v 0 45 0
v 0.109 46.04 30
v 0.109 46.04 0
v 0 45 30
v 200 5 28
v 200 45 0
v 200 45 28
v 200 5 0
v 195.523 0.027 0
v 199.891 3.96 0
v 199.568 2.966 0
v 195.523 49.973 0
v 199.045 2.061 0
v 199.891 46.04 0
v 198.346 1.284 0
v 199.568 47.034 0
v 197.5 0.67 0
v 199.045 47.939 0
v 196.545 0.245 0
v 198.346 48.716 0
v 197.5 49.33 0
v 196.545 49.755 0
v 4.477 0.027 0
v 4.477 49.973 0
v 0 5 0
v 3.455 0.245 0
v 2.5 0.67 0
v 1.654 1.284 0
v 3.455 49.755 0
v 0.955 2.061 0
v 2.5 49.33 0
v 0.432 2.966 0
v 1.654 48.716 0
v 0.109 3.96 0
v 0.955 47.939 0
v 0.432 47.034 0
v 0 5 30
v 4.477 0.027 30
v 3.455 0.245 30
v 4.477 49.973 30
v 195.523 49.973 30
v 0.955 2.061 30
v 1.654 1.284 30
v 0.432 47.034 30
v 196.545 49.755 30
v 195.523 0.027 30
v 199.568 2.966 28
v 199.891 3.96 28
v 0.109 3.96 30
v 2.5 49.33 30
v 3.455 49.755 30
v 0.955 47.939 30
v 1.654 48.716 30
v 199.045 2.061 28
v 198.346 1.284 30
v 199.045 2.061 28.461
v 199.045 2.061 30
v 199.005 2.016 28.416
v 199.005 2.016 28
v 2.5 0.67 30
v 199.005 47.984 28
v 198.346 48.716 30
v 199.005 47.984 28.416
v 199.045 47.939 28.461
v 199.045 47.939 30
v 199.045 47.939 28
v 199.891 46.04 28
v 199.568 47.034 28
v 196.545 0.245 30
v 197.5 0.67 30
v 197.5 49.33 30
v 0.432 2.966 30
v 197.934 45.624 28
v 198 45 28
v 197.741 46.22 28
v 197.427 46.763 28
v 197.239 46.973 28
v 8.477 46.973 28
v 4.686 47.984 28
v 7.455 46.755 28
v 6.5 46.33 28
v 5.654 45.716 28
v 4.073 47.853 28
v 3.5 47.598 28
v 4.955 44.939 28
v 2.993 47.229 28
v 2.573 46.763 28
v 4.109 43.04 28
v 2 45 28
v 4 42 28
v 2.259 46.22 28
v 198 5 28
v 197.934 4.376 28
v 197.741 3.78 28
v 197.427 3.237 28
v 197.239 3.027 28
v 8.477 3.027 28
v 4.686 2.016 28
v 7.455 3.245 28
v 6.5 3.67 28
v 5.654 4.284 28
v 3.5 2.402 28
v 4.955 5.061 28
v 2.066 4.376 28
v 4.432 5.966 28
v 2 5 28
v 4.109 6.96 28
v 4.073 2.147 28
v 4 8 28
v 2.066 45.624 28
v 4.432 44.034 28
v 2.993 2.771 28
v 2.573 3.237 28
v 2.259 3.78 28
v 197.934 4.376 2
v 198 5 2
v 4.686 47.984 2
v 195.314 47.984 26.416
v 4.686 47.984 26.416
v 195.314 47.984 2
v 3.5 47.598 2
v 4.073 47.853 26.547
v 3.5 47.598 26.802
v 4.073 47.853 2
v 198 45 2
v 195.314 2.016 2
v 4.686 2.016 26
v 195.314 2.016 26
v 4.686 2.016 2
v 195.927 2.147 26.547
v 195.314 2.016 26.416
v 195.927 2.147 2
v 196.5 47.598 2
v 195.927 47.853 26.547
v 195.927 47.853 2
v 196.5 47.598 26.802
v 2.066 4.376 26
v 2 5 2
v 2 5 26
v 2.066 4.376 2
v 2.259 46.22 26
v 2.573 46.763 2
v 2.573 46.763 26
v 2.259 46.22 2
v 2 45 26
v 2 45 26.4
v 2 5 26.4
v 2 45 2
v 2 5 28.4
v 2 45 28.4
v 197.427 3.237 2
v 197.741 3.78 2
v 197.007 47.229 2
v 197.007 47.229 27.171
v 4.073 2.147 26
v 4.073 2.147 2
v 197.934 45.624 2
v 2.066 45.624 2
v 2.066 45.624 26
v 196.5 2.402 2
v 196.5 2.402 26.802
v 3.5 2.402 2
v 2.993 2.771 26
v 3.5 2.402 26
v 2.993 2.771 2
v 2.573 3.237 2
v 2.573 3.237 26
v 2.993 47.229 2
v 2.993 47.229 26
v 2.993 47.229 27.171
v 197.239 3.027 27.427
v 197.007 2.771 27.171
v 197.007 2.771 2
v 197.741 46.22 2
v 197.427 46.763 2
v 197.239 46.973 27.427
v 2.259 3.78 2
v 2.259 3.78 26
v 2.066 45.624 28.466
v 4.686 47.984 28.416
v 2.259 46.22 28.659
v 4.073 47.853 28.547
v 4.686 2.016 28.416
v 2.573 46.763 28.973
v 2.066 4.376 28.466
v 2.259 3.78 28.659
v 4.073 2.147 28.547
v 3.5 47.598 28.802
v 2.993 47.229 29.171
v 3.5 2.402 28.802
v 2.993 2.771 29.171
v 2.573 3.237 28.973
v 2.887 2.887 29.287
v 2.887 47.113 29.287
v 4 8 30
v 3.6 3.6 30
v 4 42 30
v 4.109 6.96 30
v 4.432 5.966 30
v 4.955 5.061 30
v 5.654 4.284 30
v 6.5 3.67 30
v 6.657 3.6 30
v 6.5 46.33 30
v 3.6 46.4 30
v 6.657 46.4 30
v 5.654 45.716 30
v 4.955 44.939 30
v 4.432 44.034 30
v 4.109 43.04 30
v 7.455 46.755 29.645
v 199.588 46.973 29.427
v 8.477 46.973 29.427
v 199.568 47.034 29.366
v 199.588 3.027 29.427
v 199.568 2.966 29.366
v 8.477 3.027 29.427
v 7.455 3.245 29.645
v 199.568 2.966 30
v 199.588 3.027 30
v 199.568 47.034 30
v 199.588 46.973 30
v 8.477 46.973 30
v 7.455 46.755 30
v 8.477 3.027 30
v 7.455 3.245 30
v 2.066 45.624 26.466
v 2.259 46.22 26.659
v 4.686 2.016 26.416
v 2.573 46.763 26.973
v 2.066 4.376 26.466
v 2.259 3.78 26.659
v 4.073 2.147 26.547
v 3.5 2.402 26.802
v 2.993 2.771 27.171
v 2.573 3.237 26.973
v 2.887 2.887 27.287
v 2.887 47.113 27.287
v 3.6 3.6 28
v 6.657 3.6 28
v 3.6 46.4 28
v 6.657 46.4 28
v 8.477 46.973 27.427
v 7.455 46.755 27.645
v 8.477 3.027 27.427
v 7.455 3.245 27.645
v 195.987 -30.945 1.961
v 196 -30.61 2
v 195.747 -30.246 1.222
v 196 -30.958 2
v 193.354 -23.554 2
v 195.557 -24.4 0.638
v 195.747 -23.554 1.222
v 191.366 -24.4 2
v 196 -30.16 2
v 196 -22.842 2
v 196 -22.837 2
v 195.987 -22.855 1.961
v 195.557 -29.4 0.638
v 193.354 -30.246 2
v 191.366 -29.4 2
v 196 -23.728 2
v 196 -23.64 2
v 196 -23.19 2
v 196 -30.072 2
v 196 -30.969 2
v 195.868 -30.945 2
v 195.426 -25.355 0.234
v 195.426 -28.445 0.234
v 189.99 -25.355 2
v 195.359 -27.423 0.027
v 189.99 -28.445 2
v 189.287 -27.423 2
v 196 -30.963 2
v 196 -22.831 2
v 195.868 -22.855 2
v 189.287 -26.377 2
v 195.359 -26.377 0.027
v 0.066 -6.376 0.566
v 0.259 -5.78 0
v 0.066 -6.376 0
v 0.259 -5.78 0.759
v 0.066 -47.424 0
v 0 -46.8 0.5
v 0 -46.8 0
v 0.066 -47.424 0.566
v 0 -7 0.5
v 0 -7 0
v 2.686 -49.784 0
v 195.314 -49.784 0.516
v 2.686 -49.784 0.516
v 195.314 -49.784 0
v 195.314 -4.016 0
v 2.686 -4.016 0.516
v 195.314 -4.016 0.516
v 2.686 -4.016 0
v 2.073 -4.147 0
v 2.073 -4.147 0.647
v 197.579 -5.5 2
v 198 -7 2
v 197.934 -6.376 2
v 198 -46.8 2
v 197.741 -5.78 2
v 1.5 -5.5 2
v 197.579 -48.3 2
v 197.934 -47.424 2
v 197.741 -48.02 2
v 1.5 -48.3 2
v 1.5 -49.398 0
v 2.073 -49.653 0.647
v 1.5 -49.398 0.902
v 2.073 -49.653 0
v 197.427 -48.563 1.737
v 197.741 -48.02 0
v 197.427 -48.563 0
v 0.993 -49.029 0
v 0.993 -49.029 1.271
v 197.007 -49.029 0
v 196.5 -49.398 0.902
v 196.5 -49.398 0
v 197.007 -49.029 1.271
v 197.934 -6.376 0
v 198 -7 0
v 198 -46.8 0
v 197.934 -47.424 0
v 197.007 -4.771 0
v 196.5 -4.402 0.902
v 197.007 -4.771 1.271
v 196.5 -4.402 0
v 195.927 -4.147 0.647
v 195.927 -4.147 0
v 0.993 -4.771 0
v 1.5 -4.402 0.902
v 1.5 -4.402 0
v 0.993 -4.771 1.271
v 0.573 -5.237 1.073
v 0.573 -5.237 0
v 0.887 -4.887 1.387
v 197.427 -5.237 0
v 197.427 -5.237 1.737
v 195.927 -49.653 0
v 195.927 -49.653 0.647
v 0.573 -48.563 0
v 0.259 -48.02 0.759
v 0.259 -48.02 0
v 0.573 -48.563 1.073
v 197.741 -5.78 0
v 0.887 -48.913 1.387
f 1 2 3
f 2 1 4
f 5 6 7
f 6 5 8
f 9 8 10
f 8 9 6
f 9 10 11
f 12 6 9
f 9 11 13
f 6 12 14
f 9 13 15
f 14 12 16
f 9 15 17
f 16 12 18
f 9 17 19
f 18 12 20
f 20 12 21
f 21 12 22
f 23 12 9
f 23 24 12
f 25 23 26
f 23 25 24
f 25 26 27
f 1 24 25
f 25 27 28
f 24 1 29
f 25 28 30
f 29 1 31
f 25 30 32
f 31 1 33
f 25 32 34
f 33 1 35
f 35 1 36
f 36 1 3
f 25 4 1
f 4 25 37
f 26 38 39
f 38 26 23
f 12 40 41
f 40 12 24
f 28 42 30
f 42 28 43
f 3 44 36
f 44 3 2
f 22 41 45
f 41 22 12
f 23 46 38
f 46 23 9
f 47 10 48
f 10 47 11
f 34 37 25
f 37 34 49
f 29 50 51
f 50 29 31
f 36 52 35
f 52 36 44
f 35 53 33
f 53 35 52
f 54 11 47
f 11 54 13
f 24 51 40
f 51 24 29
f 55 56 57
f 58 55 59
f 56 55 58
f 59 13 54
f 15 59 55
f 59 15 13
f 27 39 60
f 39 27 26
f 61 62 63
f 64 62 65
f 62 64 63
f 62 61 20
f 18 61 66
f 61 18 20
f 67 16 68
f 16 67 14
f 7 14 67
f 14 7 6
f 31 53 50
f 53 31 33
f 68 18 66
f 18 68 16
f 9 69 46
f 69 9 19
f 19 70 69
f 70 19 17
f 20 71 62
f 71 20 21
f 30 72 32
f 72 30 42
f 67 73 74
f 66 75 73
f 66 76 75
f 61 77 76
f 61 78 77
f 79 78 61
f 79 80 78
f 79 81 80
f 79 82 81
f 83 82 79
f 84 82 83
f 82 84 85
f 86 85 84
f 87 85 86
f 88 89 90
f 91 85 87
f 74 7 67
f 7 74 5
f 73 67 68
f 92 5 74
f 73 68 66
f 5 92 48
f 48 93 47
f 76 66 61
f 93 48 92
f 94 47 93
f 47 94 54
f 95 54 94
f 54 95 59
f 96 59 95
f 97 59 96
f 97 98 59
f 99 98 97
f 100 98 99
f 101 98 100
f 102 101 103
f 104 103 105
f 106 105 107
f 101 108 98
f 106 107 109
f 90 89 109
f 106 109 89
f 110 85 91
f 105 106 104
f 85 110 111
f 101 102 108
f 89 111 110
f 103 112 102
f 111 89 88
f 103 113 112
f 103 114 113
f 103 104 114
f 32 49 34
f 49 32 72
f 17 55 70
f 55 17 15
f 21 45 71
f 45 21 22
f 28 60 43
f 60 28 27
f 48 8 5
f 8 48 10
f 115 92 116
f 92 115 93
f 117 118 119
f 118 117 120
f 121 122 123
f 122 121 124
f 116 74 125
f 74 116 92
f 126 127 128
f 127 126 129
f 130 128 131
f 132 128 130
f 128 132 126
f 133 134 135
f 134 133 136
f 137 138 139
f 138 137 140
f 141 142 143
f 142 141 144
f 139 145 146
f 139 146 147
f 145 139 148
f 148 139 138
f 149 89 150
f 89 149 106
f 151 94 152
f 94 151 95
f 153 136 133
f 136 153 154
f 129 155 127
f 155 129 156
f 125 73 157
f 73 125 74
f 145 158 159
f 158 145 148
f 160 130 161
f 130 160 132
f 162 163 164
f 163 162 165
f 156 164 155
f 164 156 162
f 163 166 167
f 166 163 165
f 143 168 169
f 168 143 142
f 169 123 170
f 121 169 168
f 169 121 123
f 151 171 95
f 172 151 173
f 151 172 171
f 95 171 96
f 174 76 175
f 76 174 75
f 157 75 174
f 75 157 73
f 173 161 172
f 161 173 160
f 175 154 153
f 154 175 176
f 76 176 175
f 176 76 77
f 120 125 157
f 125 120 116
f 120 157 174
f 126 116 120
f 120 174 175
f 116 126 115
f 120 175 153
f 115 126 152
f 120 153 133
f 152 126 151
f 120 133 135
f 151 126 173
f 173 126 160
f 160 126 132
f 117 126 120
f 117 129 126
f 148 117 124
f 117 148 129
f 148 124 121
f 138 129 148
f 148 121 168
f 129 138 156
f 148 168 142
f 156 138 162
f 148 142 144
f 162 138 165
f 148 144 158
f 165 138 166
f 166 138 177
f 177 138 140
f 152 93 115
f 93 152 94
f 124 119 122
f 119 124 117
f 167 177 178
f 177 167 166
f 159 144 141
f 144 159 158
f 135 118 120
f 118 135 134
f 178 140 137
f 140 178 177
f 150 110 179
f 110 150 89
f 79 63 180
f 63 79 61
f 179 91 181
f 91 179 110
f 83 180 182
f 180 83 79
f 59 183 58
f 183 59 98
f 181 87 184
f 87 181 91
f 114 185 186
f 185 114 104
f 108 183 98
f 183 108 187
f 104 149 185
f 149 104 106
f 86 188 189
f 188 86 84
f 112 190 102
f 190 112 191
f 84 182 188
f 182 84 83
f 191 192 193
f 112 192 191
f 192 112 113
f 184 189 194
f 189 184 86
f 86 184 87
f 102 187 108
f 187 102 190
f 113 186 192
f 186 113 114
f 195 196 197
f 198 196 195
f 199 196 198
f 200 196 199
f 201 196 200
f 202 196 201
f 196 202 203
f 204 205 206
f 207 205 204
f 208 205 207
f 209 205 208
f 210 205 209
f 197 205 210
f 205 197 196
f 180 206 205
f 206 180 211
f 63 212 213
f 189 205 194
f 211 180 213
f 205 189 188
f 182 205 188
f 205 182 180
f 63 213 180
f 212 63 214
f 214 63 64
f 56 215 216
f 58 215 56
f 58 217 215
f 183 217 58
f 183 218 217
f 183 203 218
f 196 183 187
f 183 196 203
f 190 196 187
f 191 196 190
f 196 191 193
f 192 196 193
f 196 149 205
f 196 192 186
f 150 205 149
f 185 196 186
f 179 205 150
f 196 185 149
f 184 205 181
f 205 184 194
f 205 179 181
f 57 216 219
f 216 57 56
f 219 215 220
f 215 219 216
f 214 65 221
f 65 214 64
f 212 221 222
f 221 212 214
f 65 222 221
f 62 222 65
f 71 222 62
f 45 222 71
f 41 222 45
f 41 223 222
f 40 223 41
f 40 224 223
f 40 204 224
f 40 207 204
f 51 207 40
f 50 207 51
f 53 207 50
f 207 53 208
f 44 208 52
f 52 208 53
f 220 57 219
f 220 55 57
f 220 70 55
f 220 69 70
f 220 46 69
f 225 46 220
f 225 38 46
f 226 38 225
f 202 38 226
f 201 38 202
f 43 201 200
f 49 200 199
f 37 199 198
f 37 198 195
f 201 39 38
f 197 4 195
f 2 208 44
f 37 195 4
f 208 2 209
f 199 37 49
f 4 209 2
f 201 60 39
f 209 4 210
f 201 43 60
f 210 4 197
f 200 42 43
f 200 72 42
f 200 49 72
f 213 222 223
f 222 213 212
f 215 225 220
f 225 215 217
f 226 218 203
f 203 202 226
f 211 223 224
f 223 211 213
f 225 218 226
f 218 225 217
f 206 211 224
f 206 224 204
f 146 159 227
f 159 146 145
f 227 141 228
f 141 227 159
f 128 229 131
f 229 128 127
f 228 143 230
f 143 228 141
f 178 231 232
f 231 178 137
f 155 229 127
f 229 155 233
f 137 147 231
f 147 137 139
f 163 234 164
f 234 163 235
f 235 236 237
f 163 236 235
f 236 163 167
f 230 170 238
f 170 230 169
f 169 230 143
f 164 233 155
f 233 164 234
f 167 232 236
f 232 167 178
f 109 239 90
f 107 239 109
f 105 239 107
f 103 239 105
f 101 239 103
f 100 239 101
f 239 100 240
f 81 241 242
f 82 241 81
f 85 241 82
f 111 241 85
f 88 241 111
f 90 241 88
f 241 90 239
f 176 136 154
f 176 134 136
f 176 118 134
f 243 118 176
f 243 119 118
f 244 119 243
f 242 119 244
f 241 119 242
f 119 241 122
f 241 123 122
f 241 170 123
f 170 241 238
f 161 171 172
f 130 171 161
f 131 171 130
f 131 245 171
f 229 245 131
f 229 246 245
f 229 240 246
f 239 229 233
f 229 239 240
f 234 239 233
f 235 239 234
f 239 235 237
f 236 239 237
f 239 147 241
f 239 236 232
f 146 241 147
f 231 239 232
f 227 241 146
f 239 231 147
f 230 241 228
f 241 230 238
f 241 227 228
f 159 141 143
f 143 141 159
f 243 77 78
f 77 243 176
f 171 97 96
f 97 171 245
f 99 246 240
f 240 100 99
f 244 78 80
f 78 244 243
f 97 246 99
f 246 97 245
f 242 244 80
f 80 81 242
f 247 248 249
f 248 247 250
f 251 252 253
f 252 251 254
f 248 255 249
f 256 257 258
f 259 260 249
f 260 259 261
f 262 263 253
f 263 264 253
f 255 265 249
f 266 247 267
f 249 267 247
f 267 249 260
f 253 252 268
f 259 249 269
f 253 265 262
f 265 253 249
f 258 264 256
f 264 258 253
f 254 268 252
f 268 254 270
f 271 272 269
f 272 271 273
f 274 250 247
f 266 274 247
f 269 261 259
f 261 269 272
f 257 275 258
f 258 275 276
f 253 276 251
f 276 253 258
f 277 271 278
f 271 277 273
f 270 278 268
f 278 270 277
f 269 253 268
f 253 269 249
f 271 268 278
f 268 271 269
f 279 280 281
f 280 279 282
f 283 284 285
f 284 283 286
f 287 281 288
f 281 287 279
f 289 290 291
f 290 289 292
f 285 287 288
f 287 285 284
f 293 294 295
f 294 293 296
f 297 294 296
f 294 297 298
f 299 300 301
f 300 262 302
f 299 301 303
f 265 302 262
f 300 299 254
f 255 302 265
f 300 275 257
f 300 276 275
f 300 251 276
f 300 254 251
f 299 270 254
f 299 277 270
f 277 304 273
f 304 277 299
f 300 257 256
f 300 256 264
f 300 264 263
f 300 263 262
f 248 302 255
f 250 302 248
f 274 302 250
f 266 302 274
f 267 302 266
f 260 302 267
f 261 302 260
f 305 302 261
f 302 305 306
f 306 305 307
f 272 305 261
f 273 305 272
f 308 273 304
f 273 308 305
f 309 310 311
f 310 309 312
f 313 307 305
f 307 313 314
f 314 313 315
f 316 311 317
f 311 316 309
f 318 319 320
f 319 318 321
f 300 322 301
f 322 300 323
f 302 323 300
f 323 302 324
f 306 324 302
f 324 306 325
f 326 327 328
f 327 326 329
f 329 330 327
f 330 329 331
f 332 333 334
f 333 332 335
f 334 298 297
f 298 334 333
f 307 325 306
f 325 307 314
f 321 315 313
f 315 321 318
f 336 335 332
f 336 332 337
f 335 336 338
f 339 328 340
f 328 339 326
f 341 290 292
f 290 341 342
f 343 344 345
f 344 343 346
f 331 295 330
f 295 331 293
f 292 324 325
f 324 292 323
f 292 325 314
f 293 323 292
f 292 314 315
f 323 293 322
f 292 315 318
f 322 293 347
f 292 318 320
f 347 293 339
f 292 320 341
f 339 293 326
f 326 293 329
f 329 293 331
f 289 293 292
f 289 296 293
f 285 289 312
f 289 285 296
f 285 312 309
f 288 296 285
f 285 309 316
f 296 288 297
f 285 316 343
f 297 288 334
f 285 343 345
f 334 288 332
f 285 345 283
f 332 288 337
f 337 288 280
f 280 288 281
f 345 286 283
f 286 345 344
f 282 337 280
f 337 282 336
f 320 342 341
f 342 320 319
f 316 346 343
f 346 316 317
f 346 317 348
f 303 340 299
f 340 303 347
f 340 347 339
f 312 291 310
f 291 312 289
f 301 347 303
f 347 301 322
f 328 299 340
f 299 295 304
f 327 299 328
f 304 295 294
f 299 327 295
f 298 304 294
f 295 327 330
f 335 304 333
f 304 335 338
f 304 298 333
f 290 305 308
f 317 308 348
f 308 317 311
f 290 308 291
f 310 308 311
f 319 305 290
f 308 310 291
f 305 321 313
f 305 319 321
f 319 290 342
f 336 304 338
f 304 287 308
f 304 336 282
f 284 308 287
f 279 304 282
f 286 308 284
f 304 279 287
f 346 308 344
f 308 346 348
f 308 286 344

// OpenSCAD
itemsShown="both"; // [both,box,lid]
boxLength=200;
boxWidth=50;
boxHeight=30;
cornerRadius=5;
wallThickness=2;
bottomThickness=2;
lidThickness=2;
lidClearance=0.2;
lidEdgeThickness=0.5;
// Notch in the lid
withNotch=true;//true;//[true:false]

/* [Global] */
if (itemsShown=="box") showBox();
if (itemsShown=="lid") showLid();
if (itemsShown=="both"){showBox();showLid();}

module showLid(){
	translate ([0, -2*wallThickness, 0]) 
	roundBoxLid(l=boxLength-wallThickness,
				w=boxWidth-2*wallThickness-lidClearance,
				h=lidThickness,
				et=lidEdgeThickness,
				r=cornerRadius-wallThickness,
				notch=withNotch);
}

module showBox(){
	round_box(l=boxLength,
			  w=boxWidth,
			  h=boxHeight,
			  bt=bottomThickness,
			  wt=wallThickness,
			  lt=lidThickness,
			  r=cornerRadius);
}

module round_box(l=40,w=30,h=30,bt=2,wt=2,lt=2,r=5,){
	difference() { 
		round_cube(l=l,w=w,h=h-lt,r=r);
		translate ([wt, wt, bt]) 
		round_cube(l=l-wt*2,w=w-wt*2,h=h,r=r-wt);
	}
	//use two box rims. one to make a slope to support the lid
	roundBoxRim();
	translate ([0, 0, -wt]) roundBoxRim();
}

module roundBoxRim(l=boxLength,
				   w=boxWidth,
				   h=boxHeight,
				   et=lidEdgeThickness,
				   r=cornerRadius,
				   wt=wallThickness,
				   lt=lidThickness){
	difference() { 
		translate ([0, 0, h-lt]) 
		round_cube(l=l,w=w,h=lt,r=r);
		translate ([wt+lt,wt+lt-et*2,h-lt-0.1]) 
		round_cube(l=l*2,w=w-2*(wt+lt)+4*et,h=lt+0.2,r=r-wt+lt);

		//subtract out a lid to make the ledge
		translate ([wt, w-wt, h-lt-0.1])
		roundBoxLid(l=l*2,w=w-2*wt,h=lt+0.1,wt=wt,t=lt,et=0.5,r=r-wt,notch=false);
	}
}

module roundBoxLid(l=40,w=30,h=3,wt=2,t=2,et=0.5,r=5,notch=true){
	translate ([l, 0, 0]) 
	rotate (a = [0, 0, 180]) 
	difference(){
		round_cube(l=l,w=w,h=h,t=t,r=r);

		translate ([-1, 0, et]) rotate (a = [45, 0, 0])  cube (size = [l+2, h*2, h*2]); 
		translate ([-1, w, et]) rotate (a = [45, 0, 0])  cube (size = [l+2, h*2, h*2]); 
		translate ([l, -1, et]) rotate (a = [45, 0, 90]) cube (size = [w+2, h*2, h*2]); 
		if (notch==true){
			translate([2,w/2,h+0.001]) thumbNotch(10/2,72,t);
		}
	}
}

module thumbNotch(
	thumbR=12/2,
	angle=72,
	notchHeight=2){

	size=10*thumbR;

	rotate([0,0,90])
	difference(){
		translate([0,
					(thumbR*sin(angle)-notchHeight)/tan(angle),
					 thumbR*sin(angle)-notchHeight])
		rotate([angle,0,0])
		cylinder(r=thumbR,h=size,$fn=30);

		translate([-size,-size,0])
		cube(size*2);
	}
}

module round_cube(l=40,w=30,h=20,r=5,$fn=30){
	hull(){ 
		translate ([r, r, 0]) cylinder (h = h, r=r);
		translate ([r, w-r, 0]) cylinder (h = h, r=r);
		translate ([l-r,w-r, 0]) cylinder (h = h, r=r);
		translate ([l-r, r, 0]) cylinder (h = h, r=r);
	}
}
